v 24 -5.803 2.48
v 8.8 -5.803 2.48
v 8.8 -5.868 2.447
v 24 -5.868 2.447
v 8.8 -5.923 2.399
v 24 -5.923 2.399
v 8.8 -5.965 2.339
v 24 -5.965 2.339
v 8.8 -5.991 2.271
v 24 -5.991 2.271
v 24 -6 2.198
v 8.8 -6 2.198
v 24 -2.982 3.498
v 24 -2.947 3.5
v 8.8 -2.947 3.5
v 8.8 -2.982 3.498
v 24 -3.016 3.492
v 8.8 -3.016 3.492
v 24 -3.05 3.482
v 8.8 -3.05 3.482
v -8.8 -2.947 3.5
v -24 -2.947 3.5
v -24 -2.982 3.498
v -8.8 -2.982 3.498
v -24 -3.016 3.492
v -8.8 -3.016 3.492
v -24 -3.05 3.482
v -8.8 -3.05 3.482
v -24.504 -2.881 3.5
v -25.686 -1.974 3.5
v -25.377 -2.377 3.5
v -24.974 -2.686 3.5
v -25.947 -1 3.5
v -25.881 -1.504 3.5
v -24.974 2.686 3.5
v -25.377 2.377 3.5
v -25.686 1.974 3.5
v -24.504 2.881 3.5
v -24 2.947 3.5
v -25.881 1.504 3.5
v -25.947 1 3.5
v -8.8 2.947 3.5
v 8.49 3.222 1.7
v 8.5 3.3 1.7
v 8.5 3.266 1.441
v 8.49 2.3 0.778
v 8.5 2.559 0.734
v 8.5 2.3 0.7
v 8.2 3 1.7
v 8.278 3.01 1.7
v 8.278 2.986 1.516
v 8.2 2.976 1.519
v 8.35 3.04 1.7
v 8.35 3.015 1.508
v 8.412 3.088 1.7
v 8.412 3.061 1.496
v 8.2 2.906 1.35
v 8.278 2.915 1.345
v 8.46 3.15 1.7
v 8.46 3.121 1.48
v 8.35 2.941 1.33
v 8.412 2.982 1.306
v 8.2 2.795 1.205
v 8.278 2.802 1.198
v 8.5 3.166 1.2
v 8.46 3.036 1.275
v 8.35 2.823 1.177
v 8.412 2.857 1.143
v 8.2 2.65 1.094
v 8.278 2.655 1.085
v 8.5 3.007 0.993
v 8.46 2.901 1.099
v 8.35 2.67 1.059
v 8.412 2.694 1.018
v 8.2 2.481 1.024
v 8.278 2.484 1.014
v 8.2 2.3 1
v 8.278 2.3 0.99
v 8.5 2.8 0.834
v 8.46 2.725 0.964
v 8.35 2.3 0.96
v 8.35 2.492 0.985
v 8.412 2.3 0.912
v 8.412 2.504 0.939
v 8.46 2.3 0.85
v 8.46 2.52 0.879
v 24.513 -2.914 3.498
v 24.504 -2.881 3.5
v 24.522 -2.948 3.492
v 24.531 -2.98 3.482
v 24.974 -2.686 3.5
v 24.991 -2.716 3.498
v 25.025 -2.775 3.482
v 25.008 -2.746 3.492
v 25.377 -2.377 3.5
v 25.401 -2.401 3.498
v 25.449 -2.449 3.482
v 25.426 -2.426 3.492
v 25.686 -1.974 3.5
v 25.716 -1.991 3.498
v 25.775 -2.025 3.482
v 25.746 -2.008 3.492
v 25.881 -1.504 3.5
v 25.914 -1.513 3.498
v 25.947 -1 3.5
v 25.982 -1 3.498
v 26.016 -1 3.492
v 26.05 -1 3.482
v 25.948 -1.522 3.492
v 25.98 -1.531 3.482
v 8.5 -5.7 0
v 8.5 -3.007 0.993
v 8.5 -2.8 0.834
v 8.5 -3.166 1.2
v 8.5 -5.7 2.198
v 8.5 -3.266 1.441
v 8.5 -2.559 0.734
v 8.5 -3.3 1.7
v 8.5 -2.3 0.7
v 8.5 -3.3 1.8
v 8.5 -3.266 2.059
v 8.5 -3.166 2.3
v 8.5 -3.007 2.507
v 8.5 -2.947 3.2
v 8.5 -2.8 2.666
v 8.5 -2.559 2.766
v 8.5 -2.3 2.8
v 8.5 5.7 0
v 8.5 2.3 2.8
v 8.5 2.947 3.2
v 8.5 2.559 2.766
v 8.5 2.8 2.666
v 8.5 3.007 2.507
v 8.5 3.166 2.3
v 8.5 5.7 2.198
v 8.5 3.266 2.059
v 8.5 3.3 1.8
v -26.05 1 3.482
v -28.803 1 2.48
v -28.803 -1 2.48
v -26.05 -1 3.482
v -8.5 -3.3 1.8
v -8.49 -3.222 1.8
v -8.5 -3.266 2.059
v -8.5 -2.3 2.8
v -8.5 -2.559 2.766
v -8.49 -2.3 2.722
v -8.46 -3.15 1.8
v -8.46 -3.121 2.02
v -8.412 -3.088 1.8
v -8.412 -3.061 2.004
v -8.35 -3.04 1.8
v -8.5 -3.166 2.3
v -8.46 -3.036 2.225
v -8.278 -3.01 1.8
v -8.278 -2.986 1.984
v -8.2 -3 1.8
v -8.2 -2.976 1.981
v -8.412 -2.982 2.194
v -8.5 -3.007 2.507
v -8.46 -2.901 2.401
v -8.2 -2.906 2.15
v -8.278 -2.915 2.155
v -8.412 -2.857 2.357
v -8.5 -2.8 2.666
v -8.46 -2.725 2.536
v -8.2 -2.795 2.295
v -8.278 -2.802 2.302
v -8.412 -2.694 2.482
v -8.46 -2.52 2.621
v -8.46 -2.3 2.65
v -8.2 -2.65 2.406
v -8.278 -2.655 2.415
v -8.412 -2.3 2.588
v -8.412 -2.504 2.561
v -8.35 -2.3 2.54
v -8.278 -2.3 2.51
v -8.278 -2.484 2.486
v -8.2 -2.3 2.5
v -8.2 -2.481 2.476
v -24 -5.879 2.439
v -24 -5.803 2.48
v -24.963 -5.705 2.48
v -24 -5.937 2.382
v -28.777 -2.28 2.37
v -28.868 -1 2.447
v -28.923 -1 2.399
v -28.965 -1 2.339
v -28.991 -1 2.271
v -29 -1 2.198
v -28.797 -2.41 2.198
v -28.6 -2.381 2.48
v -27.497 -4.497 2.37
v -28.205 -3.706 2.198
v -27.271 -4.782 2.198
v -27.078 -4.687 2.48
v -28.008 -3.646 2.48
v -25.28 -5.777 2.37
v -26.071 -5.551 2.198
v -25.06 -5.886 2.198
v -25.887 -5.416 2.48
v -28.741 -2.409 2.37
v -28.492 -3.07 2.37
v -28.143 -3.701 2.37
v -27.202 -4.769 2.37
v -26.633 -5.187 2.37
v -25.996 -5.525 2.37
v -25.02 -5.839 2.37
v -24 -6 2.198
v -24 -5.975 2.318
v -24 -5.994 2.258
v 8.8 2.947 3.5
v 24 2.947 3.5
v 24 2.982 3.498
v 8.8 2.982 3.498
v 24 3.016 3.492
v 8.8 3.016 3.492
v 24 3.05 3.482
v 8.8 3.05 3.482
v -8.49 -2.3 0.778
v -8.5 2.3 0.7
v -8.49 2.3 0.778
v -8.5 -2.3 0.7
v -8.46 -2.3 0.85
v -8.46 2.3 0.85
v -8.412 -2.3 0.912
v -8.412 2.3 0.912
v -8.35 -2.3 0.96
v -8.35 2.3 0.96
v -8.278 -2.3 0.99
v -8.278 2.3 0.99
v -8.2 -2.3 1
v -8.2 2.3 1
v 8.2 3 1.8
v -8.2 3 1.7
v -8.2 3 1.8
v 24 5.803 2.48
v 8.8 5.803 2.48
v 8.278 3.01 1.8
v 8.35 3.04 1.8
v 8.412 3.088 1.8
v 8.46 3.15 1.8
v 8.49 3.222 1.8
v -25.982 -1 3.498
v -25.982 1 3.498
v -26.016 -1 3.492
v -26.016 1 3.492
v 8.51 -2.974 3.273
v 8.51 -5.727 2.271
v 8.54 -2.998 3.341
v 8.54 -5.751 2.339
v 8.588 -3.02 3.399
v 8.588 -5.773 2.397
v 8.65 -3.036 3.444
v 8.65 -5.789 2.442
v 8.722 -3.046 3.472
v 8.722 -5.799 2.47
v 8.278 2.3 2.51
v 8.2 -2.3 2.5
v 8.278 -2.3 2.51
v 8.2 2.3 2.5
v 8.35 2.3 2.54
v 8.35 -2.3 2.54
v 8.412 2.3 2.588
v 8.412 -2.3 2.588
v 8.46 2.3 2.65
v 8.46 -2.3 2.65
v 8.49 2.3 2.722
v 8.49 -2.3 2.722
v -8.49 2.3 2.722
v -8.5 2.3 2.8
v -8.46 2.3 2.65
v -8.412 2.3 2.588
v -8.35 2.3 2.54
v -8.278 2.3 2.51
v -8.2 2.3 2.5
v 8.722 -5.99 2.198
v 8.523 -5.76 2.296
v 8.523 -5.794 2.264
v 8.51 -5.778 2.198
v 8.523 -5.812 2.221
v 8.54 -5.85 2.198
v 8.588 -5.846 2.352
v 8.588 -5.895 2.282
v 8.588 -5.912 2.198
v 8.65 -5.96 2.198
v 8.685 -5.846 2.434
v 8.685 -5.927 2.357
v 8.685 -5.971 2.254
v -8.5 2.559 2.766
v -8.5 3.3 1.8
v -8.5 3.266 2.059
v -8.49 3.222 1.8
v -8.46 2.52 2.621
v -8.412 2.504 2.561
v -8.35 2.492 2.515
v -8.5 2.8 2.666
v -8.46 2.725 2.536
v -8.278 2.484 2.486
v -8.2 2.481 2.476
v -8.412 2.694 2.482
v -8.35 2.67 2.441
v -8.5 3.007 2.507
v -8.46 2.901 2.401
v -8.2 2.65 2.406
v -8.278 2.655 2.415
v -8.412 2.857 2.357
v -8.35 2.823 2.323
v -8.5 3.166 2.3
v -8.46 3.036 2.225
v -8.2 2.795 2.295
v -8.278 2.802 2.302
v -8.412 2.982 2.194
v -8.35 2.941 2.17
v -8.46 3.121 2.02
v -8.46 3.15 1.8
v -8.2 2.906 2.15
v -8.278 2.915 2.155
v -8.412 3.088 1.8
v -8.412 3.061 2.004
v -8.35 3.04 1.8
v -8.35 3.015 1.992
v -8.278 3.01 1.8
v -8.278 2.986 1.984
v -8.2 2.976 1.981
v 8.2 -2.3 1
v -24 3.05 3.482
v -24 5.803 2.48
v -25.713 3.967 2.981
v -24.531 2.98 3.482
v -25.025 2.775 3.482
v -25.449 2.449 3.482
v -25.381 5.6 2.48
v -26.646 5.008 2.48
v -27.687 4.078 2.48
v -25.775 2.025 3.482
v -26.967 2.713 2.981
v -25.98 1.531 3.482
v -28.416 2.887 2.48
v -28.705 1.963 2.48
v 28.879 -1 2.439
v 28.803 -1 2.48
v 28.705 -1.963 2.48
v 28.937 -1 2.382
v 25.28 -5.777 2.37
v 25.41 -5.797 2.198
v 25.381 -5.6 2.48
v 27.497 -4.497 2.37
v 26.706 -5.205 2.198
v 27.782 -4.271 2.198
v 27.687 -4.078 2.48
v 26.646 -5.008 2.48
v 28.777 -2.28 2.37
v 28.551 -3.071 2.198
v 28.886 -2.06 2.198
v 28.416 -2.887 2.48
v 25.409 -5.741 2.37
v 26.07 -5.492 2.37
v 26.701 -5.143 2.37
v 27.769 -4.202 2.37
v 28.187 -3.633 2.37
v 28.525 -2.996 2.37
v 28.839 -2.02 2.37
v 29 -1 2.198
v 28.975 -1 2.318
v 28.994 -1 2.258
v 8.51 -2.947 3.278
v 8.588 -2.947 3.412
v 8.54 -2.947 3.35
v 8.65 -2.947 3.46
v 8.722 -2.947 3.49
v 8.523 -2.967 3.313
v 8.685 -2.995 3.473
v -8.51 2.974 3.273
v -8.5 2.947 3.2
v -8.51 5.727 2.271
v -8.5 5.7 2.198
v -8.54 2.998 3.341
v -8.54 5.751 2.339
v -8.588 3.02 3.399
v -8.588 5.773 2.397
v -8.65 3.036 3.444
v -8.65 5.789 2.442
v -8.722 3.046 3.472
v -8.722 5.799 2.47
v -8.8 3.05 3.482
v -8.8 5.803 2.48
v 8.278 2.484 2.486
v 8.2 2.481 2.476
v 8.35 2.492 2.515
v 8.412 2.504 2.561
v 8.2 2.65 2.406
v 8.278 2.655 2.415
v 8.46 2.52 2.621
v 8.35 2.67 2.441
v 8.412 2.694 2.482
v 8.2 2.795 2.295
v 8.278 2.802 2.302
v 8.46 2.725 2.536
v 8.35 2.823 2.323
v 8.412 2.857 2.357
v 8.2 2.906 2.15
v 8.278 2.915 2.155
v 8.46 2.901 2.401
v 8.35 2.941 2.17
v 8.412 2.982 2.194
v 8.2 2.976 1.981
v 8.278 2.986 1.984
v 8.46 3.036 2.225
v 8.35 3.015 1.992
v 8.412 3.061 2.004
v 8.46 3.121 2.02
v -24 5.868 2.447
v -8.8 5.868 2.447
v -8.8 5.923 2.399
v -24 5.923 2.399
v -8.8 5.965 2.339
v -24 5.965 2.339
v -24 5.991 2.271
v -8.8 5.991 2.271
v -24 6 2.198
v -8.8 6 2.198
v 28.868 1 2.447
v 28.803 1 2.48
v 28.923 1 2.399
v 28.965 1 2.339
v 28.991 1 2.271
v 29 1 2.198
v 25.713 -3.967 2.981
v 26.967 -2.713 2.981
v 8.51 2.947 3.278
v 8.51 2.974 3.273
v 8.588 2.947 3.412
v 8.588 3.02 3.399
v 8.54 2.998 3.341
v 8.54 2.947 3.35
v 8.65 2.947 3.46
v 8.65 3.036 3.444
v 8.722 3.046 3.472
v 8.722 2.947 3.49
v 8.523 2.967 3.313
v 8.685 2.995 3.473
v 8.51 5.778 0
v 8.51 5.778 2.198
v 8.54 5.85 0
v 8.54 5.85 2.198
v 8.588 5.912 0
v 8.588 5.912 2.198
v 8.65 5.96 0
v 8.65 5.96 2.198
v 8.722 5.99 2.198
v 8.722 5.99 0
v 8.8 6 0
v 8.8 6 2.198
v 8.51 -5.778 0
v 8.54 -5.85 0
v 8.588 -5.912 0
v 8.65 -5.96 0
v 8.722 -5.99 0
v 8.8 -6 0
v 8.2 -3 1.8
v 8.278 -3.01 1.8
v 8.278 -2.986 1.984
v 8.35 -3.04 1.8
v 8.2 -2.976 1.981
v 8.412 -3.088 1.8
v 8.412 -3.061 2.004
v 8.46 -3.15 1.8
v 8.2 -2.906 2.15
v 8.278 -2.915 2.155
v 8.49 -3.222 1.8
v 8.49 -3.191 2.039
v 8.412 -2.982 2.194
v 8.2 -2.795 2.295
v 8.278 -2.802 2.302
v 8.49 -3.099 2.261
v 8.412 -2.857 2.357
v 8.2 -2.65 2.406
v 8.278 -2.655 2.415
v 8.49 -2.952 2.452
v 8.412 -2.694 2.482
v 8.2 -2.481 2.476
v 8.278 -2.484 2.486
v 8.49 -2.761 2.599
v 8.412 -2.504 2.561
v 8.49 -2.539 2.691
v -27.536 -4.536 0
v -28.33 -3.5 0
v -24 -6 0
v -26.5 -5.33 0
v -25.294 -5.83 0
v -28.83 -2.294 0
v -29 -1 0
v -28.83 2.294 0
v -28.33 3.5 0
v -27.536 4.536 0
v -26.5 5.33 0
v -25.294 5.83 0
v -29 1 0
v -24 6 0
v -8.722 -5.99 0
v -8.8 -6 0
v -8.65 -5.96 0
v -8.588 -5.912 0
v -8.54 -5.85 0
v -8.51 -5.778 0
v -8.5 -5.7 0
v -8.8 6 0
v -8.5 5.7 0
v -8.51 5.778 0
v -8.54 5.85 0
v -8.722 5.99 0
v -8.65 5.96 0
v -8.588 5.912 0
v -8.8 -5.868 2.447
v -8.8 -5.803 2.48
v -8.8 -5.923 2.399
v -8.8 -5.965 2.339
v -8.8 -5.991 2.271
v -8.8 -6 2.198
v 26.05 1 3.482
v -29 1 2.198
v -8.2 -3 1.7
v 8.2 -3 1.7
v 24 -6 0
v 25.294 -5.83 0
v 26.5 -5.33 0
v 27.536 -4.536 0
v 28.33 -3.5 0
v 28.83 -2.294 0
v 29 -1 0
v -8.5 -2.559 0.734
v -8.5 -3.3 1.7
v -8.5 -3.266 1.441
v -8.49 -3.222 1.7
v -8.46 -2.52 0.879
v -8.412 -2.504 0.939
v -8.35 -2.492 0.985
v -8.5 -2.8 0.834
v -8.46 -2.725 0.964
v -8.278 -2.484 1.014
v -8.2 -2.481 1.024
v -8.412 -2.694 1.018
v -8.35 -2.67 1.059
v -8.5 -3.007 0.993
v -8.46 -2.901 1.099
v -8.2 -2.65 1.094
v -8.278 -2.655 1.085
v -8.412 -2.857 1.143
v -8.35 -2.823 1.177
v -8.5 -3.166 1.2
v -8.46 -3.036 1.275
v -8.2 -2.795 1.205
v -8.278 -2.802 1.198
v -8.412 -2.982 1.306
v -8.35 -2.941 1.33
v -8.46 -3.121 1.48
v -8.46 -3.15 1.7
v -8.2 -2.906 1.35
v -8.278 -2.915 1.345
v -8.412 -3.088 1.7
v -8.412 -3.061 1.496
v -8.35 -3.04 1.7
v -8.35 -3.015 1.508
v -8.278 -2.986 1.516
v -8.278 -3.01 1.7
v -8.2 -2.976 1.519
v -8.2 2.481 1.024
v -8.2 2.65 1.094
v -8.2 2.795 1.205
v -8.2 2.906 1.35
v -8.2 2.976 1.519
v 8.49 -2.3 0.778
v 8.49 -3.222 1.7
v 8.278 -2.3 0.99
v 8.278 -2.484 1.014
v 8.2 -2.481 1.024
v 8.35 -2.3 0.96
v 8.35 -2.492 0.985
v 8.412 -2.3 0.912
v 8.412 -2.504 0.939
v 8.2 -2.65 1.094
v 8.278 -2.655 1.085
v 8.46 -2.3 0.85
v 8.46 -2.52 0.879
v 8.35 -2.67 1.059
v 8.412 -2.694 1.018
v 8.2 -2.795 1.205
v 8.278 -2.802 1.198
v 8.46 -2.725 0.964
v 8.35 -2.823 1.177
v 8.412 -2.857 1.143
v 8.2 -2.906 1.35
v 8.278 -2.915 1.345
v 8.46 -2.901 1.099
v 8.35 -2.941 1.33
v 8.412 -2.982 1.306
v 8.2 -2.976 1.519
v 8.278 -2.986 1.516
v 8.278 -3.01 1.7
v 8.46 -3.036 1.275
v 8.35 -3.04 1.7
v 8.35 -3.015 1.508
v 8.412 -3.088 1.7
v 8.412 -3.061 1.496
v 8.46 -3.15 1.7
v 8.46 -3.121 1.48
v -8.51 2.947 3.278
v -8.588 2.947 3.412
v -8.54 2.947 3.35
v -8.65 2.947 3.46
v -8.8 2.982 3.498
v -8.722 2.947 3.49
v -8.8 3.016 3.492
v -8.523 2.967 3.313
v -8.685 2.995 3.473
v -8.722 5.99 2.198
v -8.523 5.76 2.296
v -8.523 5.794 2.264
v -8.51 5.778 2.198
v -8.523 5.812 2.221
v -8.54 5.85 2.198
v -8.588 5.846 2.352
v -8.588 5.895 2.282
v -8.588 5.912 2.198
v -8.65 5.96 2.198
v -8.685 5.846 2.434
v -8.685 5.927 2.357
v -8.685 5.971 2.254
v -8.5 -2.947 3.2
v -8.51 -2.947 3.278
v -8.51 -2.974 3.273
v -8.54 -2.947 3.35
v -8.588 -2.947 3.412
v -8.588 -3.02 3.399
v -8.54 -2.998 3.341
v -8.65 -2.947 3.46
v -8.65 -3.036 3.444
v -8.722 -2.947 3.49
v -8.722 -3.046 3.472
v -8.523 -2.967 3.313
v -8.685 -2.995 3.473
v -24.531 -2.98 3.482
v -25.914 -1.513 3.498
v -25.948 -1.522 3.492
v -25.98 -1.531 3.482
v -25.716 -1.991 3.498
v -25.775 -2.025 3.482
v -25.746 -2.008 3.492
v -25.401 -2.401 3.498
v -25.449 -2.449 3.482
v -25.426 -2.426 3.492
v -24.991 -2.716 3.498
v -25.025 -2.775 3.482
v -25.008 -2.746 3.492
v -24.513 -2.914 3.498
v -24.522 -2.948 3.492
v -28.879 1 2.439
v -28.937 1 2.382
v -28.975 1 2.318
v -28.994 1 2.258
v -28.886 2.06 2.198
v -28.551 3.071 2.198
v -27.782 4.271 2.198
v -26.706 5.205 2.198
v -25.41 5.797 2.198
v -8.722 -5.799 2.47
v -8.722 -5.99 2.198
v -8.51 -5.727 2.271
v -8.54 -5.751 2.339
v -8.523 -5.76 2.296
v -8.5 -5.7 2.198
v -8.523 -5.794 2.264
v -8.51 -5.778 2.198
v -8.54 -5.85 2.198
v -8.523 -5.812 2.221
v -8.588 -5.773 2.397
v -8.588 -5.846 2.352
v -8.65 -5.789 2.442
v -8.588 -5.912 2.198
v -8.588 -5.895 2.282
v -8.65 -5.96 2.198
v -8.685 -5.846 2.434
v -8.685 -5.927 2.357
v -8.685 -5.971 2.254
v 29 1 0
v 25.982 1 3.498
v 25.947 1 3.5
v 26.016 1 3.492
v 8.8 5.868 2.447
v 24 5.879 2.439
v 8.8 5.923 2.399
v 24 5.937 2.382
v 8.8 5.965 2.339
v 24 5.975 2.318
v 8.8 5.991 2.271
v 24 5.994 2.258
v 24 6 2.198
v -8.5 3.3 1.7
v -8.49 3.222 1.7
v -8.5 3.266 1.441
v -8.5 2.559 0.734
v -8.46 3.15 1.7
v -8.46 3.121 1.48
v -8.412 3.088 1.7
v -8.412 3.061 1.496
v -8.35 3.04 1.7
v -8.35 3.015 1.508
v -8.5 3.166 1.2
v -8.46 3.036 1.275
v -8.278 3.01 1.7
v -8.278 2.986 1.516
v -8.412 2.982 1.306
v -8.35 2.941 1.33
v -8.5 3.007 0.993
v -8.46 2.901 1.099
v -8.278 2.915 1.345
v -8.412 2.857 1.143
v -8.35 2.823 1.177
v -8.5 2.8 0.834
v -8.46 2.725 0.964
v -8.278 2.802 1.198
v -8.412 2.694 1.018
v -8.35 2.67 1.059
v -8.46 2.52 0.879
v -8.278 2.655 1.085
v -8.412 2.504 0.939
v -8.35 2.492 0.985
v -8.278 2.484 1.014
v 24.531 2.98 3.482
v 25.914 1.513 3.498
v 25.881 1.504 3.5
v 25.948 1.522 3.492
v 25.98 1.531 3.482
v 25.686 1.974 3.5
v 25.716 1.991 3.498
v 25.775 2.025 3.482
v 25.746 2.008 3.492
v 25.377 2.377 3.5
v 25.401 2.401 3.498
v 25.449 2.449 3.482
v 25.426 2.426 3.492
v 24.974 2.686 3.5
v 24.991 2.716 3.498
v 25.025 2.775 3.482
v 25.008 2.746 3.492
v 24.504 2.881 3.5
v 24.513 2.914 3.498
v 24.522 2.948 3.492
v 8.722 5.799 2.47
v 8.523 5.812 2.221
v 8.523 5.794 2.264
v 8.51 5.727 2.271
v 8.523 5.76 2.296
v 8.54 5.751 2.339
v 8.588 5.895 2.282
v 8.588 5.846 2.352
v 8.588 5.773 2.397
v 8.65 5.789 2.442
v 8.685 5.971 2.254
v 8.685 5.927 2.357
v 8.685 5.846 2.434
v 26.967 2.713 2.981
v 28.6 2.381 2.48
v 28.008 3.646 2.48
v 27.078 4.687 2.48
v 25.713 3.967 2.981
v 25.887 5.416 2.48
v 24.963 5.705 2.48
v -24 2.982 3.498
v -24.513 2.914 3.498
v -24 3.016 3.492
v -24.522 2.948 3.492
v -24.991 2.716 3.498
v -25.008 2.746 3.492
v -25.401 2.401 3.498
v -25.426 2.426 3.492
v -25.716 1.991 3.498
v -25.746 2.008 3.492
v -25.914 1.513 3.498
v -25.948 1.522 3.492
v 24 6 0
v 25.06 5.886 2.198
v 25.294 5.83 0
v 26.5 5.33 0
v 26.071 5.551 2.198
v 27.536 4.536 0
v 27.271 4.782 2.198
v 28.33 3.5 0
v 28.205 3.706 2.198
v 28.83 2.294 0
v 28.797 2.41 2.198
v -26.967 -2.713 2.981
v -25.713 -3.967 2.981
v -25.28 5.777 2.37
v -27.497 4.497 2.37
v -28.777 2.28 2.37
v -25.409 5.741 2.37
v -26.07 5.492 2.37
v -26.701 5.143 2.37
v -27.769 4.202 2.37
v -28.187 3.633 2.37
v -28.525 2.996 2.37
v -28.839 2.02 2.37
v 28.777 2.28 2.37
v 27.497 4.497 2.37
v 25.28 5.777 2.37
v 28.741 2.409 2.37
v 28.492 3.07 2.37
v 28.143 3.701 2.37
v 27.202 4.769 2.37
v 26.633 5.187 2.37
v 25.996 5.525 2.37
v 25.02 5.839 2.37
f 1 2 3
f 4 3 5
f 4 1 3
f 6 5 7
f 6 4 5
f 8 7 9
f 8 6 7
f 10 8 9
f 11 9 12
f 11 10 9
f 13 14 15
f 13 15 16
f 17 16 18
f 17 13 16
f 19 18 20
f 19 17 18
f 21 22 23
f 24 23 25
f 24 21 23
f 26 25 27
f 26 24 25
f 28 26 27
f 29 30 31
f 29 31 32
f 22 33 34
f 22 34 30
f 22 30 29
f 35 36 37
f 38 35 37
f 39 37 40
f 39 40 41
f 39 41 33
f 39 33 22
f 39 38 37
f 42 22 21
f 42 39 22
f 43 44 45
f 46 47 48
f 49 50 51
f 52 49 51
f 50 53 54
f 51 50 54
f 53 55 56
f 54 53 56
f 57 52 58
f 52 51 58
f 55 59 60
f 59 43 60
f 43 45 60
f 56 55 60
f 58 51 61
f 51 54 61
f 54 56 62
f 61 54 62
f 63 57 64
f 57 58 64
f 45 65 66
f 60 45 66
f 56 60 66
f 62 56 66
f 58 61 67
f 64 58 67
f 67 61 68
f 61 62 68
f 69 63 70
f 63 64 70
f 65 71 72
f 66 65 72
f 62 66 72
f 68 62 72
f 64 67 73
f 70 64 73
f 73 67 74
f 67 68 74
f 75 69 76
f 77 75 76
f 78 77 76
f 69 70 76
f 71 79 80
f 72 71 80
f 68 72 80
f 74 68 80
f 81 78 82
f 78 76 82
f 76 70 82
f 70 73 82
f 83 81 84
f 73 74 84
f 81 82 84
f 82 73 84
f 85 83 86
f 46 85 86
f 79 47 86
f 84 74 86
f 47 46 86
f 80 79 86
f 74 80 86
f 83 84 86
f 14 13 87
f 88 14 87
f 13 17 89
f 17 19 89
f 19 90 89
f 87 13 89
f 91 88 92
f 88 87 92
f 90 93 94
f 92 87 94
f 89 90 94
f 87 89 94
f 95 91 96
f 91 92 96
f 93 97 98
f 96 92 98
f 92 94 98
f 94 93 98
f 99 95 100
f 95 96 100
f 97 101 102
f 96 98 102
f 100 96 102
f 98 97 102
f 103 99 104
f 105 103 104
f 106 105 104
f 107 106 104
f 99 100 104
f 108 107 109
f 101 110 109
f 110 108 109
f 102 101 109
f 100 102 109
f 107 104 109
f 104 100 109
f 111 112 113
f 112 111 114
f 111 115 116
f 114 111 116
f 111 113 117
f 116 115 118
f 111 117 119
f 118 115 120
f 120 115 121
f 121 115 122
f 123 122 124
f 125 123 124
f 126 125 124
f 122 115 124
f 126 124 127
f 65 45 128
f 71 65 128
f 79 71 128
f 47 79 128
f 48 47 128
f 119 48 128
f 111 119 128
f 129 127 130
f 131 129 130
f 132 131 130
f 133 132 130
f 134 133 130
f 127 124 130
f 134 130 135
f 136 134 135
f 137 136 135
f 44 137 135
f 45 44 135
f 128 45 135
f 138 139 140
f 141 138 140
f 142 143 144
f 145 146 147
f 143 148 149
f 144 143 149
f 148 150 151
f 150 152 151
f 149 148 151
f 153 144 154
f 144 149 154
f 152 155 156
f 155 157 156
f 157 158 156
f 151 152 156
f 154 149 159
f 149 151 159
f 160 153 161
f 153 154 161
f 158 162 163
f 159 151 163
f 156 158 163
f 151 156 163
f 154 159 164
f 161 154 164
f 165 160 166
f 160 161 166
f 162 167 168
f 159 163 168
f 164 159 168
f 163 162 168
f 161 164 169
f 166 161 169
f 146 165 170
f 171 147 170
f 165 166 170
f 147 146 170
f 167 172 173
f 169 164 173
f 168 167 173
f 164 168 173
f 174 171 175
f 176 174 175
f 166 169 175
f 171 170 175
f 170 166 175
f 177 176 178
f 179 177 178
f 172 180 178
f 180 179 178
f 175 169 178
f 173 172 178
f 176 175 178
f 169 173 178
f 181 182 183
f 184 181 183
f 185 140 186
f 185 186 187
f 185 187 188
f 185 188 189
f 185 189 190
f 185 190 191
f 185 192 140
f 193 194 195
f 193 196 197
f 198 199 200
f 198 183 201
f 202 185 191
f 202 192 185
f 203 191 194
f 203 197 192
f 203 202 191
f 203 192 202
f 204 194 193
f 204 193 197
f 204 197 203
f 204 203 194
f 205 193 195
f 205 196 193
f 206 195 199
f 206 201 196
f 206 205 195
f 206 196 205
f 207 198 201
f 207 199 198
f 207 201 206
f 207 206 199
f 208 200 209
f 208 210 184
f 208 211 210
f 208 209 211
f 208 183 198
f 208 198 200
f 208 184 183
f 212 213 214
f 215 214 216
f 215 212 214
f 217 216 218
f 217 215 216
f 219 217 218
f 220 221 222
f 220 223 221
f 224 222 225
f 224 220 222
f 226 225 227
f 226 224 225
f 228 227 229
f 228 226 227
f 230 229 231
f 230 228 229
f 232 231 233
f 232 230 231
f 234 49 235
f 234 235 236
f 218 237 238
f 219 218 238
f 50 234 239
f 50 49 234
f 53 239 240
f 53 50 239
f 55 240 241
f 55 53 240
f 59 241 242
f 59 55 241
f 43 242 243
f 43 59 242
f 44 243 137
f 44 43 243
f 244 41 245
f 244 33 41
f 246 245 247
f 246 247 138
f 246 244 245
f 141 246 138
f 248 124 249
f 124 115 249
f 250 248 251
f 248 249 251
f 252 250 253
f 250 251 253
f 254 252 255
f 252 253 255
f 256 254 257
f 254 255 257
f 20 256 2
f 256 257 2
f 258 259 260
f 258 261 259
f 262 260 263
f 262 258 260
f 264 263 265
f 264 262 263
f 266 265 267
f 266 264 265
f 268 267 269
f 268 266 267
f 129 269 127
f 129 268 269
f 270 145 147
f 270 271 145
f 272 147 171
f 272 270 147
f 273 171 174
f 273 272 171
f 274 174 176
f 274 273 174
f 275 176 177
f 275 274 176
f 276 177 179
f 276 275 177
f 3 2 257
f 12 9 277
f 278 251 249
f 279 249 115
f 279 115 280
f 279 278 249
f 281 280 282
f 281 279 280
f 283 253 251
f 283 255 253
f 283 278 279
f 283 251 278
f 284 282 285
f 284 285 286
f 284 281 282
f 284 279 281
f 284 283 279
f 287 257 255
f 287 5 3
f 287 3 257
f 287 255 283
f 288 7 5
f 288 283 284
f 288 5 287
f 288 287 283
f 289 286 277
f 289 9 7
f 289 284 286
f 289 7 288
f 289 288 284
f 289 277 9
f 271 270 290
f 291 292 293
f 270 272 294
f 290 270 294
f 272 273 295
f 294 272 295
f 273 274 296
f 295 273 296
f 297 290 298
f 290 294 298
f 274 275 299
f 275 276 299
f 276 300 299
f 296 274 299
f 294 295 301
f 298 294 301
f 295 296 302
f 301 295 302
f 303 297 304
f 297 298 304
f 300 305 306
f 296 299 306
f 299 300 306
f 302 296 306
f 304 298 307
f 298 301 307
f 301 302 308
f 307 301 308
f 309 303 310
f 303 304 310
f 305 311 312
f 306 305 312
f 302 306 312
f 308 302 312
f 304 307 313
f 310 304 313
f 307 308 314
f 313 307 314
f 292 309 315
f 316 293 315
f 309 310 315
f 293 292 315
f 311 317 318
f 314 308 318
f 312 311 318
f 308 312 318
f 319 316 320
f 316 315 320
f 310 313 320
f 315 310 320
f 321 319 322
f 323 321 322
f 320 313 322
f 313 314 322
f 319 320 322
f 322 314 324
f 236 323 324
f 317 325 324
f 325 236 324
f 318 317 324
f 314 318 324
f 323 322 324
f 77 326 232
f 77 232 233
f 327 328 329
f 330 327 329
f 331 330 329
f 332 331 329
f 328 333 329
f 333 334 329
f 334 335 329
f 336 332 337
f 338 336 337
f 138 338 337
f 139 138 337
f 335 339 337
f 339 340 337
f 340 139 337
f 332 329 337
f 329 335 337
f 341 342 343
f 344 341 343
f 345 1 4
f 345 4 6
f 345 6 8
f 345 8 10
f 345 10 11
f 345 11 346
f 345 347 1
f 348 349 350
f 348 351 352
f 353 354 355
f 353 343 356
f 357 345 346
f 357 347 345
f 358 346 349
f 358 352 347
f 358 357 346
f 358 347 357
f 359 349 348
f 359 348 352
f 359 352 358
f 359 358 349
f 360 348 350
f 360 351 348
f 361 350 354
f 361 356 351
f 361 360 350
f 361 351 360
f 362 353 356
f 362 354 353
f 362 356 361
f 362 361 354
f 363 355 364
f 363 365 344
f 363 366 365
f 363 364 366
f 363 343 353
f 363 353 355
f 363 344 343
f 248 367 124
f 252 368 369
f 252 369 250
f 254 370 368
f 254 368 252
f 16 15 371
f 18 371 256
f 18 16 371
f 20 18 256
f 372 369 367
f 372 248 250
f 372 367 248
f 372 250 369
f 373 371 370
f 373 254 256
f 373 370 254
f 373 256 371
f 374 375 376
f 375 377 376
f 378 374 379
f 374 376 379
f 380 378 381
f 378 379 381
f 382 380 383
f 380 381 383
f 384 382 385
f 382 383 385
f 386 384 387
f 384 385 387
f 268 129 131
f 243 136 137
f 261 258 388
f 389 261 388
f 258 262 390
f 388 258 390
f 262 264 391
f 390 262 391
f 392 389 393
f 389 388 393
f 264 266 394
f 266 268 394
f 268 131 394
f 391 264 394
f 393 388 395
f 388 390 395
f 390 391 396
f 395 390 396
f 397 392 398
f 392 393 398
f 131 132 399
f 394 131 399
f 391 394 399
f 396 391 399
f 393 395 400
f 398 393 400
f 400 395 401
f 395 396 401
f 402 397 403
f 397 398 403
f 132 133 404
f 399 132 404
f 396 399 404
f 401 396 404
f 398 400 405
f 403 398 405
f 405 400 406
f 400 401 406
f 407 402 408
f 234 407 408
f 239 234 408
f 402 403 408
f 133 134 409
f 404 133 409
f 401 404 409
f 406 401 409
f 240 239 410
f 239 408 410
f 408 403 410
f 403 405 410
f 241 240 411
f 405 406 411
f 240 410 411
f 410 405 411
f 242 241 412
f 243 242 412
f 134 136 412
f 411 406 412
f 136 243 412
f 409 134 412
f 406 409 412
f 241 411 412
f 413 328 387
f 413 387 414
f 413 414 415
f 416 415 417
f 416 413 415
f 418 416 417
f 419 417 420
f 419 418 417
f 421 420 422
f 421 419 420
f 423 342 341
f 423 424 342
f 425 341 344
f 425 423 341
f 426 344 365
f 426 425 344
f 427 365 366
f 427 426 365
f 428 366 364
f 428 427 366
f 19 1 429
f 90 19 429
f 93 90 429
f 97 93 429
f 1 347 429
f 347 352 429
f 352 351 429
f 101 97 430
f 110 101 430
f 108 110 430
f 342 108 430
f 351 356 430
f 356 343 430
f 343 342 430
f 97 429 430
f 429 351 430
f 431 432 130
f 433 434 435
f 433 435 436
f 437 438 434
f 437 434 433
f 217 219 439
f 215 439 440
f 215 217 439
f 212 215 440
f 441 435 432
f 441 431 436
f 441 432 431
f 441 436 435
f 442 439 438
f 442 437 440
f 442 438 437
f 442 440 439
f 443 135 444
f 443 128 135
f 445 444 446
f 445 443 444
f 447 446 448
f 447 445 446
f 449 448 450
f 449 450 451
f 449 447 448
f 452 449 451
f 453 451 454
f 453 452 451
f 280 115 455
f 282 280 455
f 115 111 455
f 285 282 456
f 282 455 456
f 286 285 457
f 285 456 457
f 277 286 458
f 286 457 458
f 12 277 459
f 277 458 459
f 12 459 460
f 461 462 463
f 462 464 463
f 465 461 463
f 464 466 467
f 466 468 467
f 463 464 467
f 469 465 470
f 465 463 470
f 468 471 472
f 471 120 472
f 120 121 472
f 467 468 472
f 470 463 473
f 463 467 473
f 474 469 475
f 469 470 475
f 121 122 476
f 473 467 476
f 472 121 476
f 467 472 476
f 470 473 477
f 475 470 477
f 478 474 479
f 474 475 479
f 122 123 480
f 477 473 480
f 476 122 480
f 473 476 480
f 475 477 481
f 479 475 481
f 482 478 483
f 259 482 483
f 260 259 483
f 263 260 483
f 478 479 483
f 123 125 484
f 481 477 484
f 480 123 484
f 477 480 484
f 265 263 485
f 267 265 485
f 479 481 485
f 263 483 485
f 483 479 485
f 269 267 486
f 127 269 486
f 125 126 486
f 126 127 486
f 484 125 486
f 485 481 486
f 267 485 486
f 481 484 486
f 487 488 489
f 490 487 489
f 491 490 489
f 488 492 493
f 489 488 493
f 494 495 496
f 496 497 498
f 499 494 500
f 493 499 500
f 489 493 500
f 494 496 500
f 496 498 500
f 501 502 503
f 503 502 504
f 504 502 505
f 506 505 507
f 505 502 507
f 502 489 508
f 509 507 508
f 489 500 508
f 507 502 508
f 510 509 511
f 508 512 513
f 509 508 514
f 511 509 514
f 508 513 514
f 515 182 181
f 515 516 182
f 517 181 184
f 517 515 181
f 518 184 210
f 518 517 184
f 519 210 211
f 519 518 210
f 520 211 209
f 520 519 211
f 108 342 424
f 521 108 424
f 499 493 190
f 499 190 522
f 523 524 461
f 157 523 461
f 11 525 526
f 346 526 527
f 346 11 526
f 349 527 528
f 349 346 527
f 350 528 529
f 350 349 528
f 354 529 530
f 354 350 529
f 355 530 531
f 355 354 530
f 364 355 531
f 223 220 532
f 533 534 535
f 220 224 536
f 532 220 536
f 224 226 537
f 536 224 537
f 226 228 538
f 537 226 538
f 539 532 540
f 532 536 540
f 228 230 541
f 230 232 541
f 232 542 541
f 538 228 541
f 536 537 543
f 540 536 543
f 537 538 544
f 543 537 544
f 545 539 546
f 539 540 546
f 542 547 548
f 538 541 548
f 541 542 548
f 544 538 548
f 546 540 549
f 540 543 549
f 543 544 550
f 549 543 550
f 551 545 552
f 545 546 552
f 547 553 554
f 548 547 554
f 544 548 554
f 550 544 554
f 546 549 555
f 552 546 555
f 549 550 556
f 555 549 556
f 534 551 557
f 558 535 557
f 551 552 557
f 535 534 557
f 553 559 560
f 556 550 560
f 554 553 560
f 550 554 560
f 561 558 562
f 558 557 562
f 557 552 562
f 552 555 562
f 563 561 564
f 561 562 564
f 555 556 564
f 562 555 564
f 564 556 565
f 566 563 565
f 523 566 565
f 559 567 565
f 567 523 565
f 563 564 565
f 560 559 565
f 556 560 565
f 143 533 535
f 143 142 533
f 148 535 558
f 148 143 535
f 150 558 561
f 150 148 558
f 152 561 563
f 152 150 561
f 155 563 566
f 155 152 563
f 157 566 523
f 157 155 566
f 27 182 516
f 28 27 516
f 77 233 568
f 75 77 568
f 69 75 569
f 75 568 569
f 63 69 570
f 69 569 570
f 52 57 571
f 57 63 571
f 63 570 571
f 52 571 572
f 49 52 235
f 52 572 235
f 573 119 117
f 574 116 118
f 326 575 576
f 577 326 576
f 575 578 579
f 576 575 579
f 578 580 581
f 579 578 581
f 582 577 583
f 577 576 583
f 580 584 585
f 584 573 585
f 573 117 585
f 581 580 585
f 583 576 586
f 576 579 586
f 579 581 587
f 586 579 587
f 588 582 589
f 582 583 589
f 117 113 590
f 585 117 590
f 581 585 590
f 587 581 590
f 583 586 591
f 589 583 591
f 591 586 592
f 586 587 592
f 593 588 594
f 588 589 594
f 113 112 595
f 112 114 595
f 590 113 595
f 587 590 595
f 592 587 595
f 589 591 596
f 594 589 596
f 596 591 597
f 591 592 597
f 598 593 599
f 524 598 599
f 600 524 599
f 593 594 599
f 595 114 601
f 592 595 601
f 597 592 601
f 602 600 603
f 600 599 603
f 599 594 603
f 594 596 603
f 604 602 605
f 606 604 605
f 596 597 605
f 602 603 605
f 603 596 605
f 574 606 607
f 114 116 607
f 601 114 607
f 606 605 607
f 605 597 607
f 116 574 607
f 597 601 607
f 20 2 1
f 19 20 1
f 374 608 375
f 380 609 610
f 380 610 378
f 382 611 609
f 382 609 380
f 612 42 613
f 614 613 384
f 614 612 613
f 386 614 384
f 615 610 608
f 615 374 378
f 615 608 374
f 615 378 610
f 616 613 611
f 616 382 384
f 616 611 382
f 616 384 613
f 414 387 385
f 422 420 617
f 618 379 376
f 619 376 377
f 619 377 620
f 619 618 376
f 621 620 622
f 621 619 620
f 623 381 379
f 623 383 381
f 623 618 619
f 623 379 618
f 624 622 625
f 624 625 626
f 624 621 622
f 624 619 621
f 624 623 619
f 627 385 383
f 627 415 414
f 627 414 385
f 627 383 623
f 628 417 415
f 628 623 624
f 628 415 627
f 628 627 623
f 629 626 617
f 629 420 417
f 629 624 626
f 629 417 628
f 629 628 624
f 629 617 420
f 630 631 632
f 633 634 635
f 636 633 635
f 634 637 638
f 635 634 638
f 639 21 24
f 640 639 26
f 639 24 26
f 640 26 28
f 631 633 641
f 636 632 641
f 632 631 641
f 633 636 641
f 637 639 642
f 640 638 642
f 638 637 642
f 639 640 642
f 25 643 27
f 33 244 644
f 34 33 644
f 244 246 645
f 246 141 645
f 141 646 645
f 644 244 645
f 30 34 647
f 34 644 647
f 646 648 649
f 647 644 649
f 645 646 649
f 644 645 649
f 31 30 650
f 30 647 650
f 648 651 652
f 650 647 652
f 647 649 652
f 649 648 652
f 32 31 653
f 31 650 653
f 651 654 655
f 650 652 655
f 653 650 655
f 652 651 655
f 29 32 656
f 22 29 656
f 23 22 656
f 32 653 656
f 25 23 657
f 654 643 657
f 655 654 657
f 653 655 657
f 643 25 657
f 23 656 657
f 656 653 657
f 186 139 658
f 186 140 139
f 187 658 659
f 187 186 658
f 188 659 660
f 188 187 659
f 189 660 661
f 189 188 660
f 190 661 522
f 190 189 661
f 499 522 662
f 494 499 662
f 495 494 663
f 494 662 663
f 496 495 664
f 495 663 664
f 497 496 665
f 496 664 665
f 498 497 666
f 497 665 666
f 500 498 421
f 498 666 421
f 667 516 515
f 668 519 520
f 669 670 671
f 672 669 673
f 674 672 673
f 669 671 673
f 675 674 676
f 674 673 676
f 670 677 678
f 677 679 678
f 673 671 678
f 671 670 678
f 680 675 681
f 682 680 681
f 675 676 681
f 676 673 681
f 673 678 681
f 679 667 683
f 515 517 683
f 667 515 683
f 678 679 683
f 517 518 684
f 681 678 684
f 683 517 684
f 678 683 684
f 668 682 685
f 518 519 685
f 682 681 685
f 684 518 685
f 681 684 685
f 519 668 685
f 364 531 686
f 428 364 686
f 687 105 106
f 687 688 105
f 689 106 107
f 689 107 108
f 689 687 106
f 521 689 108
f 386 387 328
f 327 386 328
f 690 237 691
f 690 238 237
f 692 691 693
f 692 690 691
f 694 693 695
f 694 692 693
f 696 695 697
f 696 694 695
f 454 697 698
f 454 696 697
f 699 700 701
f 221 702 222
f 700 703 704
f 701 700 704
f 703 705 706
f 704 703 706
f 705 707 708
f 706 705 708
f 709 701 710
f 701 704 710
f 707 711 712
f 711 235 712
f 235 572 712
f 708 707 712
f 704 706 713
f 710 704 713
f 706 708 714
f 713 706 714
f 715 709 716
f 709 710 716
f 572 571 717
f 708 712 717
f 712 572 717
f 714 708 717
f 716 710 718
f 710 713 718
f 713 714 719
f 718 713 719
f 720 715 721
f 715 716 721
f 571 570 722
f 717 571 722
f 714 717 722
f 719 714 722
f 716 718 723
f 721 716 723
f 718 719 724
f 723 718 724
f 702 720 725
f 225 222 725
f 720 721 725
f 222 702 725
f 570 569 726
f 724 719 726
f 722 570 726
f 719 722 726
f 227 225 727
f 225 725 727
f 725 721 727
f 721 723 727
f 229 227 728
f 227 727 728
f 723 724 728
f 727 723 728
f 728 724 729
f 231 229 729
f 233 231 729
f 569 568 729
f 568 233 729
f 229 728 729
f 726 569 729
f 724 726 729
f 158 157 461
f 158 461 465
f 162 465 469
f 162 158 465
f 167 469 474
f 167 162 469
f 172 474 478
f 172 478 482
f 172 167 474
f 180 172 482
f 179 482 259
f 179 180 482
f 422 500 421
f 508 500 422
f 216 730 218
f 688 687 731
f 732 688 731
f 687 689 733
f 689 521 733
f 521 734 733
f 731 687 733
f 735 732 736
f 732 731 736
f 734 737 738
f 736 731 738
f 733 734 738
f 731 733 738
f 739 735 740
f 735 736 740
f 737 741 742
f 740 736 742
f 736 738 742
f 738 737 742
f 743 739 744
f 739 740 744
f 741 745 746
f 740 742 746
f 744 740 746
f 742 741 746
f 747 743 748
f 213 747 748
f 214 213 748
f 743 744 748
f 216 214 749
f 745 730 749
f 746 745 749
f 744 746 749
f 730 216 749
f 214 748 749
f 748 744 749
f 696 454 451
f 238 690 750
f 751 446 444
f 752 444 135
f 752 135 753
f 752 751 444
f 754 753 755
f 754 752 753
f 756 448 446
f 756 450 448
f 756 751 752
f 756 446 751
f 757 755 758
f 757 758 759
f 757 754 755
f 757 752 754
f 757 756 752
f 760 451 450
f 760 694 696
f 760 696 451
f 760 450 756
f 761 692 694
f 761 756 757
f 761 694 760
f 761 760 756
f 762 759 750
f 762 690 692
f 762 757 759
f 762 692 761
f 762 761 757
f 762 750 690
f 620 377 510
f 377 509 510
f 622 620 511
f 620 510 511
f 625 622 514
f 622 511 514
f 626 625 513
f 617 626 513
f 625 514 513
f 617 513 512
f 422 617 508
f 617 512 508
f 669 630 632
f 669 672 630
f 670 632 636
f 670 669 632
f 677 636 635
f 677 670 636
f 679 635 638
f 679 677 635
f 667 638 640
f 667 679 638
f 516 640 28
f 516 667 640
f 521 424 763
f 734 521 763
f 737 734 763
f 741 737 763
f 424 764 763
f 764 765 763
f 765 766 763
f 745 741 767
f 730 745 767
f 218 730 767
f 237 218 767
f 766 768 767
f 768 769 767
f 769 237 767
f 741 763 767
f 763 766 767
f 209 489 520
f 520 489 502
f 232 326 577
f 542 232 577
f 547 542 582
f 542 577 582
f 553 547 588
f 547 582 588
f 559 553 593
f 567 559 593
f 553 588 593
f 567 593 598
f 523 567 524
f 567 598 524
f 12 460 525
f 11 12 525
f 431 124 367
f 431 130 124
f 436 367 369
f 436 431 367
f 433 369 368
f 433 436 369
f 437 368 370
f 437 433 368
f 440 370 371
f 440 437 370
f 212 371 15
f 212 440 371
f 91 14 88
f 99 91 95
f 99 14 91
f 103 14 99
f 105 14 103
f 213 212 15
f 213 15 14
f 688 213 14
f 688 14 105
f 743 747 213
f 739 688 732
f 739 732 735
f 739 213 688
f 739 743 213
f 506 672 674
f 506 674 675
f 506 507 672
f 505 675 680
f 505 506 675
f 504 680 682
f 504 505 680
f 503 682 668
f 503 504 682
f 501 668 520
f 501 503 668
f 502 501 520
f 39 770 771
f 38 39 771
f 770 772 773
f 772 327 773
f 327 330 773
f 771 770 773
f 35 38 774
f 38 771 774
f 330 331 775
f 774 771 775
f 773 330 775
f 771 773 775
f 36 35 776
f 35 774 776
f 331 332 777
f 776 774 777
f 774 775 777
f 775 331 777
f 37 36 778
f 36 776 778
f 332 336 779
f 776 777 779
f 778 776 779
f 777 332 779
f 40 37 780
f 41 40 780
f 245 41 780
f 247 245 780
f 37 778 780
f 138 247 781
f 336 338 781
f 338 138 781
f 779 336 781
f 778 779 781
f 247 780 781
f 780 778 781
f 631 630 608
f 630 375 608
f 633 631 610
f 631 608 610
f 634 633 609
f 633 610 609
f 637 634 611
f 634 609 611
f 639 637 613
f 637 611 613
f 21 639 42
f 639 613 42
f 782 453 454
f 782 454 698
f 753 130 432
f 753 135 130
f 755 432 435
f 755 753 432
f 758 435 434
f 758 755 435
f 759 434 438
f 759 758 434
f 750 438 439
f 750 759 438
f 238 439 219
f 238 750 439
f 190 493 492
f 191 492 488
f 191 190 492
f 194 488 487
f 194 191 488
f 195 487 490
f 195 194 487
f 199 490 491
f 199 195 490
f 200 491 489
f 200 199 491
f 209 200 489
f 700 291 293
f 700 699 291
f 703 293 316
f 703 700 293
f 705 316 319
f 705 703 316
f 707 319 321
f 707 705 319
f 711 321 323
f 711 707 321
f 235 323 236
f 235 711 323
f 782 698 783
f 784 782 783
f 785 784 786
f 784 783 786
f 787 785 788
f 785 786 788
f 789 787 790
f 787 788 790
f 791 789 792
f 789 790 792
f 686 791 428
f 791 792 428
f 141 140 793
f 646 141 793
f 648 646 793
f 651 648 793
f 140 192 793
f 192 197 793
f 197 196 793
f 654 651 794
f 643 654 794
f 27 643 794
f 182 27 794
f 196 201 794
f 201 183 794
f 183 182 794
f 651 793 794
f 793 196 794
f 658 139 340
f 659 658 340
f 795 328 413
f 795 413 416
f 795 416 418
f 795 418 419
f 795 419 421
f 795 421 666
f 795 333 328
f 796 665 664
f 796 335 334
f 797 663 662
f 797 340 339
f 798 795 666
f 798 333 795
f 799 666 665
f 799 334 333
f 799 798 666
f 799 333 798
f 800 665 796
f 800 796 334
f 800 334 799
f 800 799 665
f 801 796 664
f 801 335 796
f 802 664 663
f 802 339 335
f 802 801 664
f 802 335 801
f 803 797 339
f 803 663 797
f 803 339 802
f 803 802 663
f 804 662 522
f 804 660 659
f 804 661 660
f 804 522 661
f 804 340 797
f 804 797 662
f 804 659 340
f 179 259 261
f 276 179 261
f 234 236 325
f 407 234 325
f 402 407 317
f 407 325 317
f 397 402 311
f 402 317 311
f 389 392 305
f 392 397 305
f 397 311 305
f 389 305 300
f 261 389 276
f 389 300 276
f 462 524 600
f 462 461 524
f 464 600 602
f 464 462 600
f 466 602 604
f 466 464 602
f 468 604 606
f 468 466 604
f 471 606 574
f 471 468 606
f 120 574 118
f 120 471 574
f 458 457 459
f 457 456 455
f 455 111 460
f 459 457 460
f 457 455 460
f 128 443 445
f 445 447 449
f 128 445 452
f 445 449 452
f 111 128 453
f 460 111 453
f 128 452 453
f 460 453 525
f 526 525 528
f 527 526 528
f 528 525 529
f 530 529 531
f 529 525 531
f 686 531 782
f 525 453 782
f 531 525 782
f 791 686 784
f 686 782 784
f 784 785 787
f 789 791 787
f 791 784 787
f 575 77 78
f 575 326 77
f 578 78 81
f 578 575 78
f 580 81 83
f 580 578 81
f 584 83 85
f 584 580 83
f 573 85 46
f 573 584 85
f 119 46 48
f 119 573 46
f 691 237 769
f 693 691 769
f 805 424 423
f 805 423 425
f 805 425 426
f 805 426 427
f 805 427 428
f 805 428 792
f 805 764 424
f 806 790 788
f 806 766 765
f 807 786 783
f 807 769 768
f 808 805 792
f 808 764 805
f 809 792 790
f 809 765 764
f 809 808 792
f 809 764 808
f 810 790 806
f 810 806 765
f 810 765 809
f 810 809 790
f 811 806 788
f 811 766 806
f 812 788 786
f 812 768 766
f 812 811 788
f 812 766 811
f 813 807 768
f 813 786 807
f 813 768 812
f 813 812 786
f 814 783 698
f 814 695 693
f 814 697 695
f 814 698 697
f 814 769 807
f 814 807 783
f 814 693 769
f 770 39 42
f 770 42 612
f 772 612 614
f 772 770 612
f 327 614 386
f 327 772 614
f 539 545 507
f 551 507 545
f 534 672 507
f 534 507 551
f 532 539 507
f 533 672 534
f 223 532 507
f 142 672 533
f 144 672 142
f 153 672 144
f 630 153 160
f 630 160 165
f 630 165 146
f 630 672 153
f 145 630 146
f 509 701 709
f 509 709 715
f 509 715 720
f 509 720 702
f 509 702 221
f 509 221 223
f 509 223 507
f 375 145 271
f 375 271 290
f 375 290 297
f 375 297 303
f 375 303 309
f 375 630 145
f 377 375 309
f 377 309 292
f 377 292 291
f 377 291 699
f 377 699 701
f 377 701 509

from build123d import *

# Parameters (mm, degrees)
F0_W       = 58
F0_H       = 12
F1_DEPTH   = 3.5
F2_W       = 14
F2_H       = 5
F2_W_2     = 6
F2_H_2     = 1.5
F3_DEPTH   = 8.5
F4_R       = 5
F5_SIZE2   = 1.0919107028
F5_SIZE    = 3
F5_2_SIZE2 = 1.0919107028
F5_2_SIZE  = 3
F6_R       = 0.7
F7_R       = 0.3


with BuildPart() as f1:
    # F0 (on Top) → F1 (new body)
    with BuildSketch(Plane.XY):
        Rectangle(F0_W, F0_H)
    extrude(amount=F1_DEPTH)

    # F2 (on Right) → F3 (cut, symmetric)
    with BuildSketch(Plane.YZ):
        with Locations((0, 1.75)):
            Rectangle(F2_W, F2_H)
        with Locations((0, 1.75)):
            Rectangle(F2_W_2, F2_H_2, mode=Mode.SUBTRACT)
    extrude(amount=F3_DEPTH, both=True, mode=Mode.SUBTRACT)

    # F4
    f4_edges = [f1.edges().sort_by_distance(p)[0] for p in [
        (29, -6, 1.75),
        (29, 6, 1.75),
        (-29, -6, 1.75),
        (-29, 6, 1.75),
    ]]
    fillet(f4_edges, radius=F4_R)

    # F5
    f5_edges = [f1.edges().sort_by_distance(p)[0] for p in [
        (16.25, -6, 3.5),
    ]]
    f5_side = f1.faces().sort_by_distance((18.333459, 0, 3.5))[0]
    chamfer(f5_edges, length=F5_SIZE, length2=F5_SIZE2, reference=f5_side)

    # F5#2
    f5_2_edges = [f1.edges().sort_by_distance(p)[0] for p in [
        (-16.25, -6, 3.5),
    ]]
    f5_2_side = f1.faces().sort_by_distance((-18.333459, 0, 3.5))[0]
    chamfer(f5_2_edges, length=F5_2_SIZE, length2=F5_2_SIZE2, reference=f5_2_side)

    # F6
    f6_edges = [f1.edges().sort_by_distance(p)[0] for p in [
        (0, 3, 2.5),
        (0, -3, 2.5),
        (0, -3, 1),
        (0, 3, 1),
    ]]
    fillet(f6_edges, radius=F6_R)

    # F7
    f7_edges = [f1.edges().sort_by_distance(p)[0] for p in [
        (8.5, 0, 2.5),
        (-8.5, 0, 2.5),
        (-8.5, 0, 3.5),
        (-8.5, -4.5, 2.954045),
        (-8.5, -6, 1.204045),
        (-8.5, 4.5, 2.954045),
        (-8.5, 6, 1.204045),
        (8.5, 6, 1.204045),
        (8.5, 4.5, 2.954045),
        (8.5, 0, 3.5),
        (8.5, -4.5, 2.954045),
        (8.5, -6, 1.204045),
        (16.25, -6, 2.408089),
        (25.414214, -2.414214, 3.5),
        (-25.414214, -2.414214, 3.5),
        (-27.535534, -4.535534, 2.408089),
    ]]
    fillet(f7_edges, radius=F7_R)


solid = f1.part
